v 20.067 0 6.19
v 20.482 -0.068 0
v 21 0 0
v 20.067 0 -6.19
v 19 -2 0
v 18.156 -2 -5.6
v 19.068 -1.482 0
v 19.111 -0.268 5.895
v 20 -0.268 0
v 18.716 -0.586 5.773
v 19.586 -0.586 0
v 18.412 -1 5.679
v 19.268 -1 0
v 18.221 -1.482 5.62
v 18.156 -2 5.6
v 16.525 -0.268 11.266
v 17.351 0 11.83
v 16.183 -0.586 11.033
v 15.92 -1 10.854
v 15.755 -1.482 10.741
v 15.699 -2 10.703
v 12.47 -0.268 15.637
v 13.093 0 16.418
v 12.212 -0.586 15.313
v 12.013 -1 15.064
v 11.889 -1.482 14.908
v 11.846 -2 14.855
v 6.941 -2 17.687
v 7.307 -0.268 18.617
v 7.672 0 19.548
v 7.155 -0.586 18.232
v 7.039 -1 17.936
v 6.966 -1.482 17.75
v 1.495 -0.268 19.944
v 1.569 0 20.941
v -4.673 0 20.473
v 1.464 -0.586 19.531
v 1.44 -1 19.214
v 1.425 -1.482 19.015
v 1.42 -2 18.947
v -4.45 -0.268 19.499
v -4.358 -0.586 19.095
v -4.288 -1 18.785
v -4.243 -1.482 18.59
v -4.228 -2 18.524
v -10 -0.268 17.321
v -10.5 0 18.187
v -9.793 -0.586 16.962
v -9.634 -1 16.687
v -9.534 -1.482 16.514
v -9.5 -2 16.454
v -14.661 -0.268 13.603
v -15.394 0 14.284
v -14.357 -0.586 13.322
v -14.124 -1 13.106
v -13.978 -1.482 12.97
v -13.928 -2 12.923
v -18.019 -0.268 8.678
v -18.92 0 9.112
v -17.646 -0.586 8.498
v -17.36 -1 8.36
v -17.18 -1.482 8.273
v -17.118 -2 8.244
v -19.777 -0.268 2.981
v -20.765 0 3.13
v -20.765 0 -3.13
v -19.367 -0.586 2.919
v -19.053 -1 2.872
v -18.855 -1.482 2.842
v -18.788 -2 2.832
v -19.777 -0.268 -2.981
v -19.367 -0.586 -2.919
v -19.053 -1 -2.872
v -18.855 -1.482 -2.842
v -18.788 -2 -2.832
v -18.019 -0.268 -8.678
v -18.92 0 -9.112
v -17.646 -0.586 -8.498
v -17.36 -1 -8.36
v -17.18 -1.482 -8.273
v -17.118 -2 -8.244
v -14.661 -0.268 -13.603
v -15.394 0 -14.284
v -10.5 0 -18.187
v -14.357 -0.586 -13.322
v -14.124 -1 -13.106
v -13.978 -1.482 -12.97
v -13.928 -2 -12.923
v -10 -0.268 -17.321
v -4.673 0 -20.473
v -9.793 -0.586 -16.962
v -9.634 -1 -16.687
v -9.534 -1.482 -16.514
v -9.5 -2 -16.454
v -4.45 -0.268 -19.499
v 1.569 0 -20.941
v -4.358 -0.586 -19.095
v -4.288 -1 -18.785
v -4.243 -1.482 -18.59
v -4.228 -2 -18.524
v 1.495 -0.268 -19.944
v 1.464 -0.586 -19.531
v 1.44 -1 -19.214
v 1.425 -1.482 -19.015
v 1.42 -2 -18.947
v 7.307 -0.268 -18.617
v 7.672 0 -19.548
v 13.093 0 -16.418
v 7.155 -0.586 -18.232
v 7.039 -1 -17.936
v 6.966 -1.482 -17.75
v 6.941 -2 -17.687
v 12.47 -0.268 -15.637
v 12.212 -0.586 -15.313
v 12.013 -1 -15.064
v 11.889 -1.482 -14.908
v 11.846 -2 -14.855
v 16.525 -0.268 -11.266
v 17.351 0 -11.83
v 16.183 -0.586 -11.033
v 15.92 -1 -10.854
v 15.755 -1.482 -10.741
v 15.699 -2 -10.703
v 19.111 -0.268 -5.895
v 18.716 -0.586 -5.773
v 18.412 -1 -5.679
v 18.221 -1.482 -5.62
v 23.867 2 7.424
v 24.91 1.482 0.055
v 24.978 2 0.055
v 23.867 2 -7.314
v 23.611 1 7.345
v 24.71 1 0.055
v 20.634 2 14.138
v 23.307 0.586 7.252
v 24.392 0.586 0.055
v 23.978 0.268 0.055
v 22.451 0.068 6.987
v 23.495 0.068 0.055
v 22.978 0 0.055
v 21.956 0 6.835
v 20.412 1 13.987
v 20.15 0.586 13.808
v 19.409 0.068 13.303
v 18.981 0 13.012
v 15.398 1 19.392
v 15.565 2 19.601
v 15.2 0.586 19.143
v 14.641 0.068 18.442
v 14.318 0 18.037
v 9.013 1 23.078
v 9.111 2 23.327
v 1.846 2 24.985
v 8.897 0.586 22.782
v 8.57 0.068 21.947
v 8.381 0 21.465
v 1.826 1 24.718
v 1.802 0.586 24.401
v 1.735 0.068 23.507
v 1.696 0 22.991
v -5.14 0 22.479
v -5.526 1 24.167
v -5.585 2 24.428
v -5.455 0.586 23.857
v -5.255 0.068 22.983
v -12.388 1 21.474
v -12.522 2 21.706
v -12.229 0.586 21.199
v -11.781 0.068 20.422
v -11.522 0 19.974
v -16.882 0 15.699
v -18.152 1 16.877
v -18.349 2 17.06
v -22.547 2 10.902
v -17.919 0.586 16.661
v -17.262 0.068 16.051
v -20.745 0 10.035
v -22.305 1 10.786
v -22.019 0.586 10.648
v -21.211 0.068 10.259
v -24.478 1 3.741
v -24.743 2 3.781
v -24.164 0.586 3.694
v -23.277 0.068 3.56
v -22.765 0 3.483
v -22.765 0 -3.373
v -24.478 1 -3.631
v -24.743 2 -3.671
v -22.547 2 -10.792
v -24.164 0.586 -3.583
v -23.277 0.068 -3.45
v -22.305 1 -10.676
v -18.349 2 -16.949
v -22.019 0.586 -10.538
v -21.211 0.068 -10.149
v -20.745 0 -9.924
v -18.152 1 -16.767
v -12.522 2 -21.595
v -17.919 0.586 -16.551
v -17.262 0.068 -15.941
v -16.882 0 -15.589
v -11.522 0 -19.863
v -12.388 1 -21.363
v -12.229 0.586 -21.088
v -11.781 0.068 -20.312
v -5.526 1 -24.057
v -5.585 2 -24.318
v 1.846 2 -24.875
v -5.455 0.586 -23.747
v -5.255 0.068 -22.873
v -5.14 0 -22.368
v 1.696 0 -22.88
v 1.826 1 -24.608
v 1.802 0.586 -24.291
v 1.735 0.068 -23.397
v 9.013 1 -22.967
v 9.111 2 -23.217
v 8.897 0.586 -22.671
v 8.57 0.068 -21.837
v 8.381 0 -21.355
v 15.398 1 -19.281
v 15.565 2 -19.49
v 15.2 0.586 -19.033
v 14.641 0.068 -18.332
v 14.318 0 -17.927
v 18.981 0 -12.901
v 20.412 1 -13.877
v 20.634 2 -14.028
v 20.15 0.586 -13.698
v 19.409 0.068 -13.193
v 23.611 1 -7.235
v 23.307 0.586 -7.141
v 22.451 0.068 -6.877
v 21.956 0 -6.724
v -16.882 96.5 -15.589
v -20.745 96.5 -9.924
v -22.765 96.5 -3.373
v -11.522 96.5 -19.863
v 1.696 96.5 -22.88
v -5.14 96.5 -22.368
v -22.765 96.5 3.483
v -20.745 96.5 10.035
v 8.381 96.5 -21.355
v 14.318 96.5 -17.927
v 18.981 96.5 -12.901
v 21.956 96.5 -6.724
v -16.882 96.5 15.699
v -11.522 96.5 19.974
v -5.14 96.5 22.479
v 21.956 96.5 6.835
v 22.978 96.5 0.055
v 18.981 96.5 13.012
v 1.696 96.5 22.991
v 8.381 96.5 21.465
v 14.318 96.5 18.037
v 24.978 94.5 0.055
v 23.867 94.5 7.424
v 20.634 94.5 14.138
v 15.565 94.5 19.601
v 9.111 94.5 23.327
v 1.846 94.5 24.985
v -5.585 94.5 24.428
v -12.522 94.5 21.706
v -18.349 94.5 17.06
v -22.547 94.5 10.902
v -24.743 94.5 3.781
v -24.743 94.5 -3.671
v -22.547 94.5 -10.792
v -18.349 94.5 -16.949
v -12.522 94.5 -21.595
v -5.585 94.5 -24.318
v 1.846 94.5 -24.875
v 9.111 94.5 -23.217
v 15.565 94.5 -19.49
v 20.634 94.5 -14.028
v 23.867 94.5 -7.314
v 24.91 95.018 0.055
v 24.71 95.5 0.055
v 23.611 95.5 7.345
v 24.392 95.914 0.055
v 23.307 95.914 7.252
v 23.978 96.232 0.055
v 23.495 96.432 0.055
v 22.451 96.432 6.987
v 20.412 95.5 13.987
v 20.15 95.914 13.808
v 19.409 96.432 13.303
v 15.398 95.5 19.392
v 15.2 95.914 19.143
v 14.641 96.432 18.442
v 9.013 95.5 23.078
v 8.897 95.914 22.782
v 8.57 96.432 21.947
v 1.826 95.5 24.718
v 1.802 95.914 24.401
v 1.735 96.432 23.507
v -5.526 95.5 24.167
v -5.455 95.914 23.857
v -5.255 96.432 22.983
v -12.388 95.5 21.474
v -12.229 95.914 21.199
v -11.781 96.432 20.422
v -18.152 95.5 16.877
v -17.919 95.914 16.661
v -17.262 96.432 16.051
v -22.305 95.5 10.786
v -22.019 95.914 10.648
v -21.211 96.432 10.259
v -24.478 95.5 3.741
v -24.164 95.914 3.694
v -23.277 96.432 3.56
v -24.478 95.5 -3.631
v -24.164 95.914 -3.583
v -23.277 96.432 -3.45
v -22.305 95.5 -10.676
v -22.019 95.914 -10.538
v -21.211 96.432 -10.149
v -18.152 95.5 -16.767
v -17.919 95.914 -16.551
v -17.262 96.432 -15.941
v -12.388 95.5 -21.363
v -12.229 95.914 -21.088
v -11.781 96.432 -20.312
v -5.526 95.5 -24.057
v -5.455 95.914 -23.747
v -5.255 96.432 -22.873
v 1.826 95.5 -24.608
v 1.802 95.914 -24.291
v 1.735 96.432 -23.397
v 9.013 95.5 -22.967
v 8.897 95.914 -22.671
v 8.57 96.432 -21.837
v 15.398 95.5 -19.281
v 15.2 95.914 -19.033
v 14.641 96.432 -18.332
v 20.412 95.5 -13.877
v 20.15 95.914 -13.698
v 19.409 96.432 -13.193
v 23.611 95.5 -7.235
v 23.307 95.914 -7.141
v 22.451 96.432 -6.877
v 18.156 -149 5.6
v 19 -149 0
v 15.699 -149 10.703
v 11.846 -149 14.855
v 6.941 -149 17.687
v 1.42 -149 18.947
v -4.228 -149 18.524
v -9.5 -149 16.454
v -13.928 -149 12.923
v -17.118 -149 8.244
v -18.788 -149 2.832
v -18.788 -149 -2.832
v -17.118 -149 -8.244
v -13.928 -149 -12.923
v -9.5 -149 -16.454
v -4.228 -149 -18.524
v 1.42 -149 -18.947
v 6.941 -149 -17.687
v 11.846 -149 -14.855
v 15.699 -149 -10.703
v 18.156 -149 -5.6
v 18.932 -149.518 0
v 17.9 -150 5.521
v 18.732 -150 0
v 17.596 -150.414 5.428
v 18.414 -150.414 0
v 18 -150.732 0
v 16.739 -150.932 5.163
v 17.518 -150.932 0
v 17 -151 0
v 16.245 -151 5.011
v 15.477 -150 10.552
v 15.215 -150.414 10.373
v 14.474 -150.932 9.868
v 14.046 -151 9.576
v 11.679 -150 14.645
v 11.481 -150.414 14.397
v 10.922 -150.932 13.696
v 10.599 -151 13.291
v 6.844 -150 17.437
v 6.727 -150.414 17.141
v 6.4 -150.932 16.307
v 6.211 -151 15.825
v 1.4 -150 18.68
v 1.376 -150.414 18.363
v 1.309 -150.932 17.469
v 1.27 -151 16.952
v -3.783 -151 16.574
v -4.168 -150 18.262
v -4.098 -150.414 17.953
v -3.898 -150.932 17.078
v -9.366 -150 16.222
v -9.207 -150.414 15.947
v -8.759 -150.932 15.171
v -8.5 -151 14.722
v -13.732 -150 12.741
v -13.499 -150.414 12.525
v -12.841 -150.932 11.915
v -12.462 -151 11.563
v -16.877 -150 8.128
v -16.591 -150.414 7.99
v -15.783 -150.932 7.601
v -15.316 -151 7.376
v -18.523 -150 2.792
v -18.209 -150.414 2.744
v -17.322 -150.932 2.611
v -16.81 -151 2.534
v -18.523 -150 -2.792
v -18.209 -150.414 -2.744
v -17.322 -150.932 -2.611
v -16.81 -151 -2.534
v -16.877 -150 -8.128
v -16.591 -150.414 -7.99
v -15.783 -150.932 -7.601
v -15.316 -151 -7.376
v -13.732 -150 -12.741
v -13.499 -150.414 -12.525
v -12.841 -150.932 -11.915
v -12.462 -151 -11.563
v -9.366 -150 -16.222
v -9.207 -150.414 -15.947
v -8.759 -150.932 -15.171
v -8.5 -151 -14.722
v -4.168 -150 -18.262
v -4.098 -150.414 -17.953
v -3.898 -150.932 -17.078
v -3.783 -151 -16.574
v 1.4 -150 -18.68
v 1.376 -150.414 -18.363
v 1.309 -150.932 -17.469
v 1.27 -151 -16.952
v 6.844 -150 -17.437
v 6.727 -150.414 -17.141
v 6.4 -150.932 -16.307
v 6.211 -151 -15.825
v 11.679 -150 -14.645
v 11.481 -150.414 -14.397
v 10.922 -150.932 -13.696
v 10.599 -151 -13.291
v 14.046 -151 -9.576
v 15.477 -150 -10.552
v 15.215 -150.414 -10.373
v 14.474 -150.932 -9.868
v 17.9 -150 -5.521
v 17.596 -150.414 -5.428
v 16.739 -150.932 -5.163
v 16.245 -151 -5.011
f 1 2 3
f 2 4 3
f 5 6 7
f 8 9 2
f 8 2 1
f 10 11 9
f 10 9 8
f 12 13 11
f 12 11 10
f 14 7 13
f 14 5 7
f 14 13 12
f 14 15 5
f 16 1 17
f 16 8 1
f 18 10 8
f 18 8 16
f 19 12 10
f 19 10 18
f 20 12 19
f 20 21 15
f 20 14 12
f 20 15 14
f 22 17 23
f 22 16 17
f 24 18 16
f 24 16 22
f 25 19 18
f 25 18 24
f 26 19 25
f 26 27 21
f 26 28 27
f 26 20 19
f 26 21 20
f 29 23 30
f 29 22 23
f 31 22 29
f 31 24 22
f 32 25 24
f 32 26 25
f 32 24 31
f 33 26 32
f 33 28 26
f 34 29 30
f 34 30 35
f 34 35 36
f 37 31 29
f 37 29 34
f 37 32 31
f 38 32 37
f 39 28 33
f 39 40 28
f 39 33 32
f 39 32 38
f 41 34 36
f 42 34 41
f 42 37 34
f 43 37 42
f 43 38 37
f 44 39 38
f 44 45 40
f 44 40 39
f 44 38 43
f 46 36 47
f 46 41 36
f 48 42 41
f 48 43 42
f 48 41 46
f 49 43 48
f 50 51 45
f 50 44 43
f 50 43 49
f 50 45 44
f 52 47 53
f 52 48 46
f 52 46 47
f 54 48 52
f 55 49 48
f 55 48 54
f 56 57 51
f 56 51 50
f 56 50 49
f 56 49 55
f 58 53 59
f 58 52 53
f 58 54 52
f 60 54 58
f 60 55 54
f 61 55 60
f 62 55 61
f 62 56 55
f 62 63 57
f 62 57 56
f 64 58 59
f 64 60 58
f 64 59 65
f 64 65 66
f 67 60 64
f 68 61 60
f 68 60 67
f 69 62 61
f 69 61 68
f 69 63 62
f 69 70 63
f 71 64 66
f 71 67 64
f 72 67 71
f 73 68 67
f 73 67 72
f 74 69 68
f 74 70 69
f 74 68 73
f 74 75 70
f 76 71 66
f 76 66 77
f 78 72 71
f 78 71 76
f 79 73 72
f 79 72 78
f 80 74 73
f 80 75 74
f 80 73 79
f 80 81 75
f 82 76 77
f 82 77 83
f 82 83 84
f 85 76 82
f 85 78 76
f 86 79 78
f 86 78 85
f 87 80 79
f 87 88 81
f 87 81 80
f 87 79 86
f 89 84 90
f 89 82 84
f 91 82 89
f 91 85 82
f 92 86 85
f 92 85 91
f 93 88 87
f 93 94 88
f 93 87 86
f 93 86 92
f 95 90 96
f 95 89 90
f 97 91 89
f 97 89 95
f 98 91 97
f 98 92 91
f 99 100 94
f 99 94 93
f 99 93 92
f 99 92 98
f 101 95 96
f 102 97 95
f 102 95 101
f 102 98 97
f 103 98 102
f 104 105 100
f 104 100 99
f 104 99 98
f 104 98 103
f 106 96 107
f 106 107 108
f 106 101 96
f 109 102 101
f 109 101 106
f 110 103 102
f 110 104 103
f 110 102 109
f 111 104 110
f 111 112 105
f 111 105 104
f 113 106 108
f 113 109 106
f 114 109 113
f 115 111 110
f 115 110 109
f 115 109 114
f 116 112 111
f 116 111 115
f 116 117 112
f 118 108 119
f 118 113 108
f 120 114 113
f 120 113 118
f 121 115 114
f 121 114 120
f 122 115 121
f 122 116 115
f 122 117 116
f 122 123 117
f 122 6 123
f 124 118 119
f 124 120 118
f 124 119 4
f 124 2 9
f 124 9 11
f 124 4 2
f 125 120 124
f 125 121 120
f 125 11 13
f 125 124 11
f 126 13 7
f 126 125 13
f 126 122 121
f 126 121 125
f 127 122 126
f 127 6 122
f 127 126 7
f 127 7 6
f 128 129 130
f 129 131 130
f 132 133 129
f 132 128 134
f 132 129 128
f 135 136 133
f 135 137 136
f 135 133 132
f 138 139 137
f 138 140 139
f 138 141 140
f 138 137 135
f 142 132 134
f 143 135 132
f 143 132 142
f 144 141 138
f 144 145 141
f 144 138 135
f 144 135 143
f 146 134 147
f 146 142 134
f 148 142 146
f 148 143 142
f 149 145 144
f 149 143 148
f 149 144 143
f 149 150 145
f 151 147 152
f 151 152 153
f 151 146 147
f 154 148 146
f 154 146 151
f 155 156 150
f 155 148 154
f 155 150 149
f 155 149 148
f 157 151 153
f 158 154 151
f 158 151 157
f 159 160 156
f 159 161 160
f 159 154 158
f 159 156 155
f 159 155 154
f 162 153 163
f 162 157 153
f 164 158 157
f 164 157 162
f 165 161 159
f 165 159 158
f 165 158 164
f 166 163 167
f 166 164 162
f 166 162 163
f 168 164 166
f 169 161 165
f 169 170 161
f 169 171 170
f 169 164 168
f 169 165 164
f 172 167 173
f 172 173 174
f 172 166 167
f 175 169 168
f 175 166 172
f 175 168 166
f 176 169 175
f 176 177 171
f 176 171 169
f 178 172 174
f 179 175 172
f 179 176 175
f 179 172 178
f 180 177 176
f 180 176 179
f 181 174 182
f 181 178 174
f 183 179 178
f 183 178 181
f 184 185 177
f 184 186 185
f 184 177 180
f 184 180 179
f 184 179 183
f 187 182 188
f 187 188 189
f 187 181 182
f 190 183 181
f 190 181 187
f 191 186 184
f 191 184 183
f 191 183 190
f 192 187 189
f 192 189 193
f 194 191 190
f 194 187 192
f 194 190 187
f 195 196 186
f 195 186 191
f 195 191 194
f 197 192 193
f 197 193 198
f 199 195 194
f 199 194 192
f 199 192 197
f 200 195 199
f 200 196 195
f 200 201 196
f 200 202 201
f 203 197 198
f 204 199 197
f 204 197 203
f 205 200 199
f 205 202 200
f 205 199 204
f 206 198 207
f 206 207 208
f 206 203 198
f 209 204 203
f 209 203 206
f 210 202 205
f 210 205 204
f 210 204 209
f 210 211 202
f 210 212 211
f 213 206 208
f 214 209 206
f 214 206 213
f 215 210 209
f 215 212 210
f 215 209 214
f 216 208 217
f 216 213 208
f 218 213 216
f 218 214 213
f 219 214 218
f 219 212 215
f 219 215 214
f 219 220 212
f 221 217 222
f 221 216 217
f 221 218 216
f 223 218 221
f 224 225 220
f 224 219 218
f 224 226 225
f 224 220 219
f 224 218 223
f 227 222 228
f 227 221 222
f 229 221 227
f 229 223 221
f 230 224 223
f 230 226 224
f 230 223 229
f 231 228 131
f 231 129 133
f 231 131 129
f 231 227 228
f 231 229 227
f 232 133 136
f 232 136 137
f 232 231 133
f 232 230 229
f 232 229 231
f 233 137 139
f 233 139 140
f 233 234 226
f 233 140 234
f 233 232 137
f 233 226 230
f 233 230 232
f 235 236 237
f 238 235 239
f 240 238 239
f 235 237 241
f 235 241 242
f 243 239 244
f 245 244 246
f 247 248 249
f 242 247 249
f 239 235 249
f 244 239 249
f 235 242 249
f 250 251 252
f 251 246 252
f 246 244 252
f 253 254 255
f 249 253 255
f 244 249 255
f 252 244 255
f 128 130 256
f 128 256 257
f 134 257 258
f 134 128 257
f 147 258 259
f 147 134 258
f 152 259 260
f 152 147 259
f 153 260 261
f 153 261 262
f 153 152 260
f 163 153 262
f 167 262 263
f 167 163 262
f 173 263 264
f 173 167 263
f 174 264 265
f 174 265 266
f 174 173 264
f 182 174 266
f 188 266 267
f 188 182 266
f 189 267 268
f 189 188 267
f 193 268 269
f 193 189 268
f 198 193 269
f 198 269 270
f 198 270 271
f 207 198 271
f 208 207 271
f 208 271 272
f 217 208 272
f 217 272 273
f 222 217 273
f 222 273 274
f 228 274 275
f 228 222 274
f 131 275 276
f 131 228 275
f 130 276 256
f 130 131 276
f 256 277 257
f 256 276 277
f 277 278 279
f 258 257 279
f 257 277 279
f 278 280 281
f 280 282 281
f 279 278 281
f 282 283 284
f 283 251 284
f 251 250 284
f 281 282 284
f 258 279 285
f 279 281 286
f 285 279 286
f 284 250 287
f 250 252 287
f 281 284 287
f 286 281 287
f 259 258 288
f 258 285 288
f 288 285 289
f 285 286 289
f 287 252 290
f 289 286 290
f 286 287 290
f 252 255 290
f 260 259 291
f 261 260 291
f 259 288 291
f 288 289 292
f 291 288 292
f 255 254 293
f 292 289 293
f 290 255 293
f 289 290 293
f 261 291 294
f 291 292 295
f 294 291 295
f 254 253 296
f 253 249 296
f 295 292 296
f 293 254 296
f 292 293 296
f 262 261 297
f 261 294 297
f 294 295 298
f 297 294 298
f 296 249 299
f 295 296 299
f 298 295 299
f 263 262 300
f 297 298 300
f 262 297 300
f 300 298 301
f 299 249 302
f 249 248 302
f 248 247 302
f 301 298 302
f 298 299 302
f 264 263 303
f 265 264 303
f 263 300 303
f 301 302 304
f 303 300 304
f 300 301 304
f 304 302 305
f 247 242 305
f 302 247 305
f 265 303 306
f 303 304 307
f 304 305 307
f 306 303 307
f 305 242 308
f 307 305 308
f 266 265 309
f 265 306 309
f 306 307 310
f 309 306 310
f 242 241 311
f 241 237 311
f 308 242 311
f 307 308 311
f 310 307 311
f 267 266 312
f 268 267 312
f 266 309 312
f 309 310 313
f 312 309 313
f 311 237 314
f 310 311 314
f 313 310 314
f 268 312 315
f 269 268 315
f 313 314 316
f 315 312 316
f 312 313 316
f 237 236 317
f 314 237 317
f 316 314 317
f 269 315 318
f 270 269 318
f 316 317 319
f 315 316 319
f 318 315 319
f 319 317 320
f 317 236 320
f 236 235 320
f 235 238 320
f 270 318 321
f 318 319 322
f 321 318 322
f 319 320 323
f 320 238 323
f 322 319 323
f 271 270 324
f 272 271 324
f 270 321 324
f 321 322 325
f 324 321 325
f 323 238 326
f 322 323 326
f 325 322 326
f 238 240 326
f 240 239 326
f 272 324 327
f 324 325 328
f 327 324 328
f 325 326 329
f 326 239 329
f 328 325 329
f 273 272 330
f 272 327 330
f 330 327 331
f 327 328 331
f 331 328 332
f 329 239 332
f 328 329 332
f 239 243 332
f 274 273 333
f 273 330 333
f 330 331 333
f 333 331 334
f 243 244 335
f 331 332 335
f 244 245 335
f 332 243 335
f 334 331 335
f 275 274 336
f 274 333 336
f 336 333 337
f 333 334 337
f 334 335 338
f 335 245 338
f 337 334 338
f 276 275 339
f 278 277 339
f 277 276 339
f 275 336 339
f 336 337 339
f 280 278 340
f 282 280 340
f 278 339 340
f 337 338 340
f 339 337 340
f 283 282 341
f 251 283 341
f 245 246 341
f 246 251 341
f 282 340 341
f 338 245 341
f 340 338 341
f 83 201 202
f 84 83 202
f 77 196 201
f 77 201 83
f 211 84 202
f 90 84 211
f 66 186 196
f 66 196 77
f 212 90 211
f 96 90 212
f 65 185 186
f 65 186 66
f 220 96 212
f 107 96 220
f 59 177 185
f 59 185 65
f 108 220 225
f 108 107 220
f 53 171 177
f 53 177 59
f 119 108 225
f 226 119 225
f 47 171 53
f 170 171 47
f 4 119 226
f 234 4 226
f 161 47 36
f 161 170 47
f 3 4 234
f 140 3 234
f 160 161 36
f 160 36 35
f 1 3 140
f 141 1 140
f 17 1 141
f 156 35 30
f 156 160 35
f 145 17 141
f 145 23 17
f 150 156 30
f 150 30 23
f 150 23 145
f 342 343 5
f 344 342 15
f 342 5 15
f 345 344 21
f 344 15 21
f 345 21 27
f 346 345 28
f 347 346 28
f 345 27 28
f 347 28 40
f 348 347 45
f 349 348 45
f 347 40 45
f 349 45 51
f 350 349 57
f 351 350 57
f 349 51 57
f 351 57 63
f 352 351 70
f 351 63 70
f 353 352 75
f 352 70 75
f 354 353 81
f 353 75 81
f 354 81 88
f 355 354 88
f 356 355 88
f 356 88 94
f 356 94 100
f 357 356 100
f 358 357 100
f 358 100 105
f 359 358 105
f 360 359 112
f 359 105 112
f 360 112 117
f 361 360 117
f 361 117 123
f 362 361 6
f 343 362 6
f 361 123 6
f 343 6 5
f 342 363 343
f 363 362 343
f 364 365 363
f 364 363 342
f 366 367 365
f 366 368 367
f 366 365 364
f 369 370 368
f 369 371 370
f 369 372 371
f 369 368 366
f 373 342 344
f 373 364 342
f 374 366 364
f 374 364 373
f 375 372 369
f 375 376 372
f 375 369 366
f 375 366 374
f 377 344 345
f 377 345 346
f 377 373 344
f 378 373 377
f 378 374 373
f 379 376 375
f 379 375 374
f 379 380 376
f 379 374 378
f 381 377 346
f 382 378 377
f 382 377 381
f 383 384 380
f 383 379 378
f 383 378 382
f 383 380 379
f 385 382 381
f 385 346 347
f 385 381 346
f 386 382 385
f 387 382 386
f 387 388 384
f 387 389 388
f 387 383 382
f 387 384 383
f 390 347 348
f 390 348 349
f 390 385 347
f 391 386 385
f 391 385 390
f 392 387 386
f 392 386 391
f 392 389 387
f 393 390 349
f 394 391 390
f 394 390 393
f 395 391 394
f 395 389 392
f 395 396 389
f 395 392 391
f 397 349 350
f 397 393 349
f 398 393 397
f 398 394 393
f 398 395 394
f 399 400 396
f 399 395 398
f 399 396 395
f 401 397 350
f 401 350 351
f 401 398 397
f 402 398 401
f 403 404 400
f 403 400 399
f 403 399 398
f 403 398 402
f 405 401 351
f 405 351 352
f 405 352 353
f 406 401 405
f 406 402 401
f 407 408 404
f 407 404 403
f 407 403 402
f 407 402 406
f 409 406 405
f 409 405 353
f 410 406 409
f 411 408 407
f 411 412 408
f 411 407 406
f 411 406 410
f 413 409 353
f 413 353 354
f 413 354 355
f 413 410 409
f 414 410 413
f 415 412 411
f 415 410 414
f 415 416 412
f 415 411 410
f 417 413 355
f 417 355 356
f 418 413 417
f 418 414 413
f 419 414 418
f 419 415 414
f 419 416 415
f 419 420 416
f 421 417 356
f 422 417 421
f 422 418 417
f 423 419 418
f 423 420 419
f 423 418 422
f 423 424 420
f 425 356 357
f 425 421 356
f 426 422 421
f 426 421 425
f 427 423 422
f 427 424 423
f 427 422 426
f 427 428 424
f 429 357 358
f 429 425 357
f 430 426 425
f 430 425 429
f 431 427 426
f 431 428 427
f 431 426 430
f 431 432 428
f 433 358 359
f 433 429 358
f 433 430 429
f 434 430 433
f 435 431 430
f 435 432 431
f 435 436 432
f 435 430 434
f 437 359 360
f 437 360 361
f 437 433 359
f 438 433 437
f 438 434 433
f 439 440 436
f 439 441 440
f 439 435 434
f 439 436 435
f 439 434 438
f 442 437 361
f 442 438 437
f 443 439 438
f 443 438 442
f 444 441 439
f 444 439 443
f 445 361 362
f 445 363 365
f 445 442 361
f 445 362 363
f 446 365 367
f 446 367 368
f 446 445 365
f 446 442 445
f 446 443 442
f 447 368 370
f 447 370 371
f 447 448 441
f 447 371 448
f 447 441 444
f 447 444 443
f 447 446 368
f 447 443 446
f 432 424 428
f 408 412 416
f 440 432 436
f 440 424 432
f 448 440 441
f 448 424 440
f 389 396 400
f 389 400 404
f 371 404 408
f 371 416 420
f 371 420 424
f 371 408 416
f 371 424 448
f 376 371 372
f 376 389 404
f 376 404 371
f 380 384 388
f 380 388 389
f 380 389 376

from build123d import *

# Parameters (mm, degrees)
F0_R     = 19
F1_DEPTH = 151
F2_R     = 25
F3_DEPTH = 96.5
F4_R     = 2


with BuildPart() as f1:
    # F0 (on Front) → F1 (new body)
    with BuildSketch(Plane.XZ):
        Circle(F0_R)
    extrude(amount=F1_DEPTH)

    # F2 (on Front) → F3 (join)
    with BuildSketch(Plane.XZ):
        with Locations((-0.022302, 0.055295)):
            Circle(F2_R)
    extrude(amount=-F3_DEPTH)

    # F4
    f4_edges = [f1.edges().sort_by_distance(p)[0] for p in [
        (-19, -151, 0),
        (19, -75.5, 0),
        (-19, 0, 0),
        (-25.022302, 0, 0.055295),
        (-25.022302, 96.5, 0.055295),
    ]]
    fillet(f4_edges, radius=F4_R)


solid = f1.part
